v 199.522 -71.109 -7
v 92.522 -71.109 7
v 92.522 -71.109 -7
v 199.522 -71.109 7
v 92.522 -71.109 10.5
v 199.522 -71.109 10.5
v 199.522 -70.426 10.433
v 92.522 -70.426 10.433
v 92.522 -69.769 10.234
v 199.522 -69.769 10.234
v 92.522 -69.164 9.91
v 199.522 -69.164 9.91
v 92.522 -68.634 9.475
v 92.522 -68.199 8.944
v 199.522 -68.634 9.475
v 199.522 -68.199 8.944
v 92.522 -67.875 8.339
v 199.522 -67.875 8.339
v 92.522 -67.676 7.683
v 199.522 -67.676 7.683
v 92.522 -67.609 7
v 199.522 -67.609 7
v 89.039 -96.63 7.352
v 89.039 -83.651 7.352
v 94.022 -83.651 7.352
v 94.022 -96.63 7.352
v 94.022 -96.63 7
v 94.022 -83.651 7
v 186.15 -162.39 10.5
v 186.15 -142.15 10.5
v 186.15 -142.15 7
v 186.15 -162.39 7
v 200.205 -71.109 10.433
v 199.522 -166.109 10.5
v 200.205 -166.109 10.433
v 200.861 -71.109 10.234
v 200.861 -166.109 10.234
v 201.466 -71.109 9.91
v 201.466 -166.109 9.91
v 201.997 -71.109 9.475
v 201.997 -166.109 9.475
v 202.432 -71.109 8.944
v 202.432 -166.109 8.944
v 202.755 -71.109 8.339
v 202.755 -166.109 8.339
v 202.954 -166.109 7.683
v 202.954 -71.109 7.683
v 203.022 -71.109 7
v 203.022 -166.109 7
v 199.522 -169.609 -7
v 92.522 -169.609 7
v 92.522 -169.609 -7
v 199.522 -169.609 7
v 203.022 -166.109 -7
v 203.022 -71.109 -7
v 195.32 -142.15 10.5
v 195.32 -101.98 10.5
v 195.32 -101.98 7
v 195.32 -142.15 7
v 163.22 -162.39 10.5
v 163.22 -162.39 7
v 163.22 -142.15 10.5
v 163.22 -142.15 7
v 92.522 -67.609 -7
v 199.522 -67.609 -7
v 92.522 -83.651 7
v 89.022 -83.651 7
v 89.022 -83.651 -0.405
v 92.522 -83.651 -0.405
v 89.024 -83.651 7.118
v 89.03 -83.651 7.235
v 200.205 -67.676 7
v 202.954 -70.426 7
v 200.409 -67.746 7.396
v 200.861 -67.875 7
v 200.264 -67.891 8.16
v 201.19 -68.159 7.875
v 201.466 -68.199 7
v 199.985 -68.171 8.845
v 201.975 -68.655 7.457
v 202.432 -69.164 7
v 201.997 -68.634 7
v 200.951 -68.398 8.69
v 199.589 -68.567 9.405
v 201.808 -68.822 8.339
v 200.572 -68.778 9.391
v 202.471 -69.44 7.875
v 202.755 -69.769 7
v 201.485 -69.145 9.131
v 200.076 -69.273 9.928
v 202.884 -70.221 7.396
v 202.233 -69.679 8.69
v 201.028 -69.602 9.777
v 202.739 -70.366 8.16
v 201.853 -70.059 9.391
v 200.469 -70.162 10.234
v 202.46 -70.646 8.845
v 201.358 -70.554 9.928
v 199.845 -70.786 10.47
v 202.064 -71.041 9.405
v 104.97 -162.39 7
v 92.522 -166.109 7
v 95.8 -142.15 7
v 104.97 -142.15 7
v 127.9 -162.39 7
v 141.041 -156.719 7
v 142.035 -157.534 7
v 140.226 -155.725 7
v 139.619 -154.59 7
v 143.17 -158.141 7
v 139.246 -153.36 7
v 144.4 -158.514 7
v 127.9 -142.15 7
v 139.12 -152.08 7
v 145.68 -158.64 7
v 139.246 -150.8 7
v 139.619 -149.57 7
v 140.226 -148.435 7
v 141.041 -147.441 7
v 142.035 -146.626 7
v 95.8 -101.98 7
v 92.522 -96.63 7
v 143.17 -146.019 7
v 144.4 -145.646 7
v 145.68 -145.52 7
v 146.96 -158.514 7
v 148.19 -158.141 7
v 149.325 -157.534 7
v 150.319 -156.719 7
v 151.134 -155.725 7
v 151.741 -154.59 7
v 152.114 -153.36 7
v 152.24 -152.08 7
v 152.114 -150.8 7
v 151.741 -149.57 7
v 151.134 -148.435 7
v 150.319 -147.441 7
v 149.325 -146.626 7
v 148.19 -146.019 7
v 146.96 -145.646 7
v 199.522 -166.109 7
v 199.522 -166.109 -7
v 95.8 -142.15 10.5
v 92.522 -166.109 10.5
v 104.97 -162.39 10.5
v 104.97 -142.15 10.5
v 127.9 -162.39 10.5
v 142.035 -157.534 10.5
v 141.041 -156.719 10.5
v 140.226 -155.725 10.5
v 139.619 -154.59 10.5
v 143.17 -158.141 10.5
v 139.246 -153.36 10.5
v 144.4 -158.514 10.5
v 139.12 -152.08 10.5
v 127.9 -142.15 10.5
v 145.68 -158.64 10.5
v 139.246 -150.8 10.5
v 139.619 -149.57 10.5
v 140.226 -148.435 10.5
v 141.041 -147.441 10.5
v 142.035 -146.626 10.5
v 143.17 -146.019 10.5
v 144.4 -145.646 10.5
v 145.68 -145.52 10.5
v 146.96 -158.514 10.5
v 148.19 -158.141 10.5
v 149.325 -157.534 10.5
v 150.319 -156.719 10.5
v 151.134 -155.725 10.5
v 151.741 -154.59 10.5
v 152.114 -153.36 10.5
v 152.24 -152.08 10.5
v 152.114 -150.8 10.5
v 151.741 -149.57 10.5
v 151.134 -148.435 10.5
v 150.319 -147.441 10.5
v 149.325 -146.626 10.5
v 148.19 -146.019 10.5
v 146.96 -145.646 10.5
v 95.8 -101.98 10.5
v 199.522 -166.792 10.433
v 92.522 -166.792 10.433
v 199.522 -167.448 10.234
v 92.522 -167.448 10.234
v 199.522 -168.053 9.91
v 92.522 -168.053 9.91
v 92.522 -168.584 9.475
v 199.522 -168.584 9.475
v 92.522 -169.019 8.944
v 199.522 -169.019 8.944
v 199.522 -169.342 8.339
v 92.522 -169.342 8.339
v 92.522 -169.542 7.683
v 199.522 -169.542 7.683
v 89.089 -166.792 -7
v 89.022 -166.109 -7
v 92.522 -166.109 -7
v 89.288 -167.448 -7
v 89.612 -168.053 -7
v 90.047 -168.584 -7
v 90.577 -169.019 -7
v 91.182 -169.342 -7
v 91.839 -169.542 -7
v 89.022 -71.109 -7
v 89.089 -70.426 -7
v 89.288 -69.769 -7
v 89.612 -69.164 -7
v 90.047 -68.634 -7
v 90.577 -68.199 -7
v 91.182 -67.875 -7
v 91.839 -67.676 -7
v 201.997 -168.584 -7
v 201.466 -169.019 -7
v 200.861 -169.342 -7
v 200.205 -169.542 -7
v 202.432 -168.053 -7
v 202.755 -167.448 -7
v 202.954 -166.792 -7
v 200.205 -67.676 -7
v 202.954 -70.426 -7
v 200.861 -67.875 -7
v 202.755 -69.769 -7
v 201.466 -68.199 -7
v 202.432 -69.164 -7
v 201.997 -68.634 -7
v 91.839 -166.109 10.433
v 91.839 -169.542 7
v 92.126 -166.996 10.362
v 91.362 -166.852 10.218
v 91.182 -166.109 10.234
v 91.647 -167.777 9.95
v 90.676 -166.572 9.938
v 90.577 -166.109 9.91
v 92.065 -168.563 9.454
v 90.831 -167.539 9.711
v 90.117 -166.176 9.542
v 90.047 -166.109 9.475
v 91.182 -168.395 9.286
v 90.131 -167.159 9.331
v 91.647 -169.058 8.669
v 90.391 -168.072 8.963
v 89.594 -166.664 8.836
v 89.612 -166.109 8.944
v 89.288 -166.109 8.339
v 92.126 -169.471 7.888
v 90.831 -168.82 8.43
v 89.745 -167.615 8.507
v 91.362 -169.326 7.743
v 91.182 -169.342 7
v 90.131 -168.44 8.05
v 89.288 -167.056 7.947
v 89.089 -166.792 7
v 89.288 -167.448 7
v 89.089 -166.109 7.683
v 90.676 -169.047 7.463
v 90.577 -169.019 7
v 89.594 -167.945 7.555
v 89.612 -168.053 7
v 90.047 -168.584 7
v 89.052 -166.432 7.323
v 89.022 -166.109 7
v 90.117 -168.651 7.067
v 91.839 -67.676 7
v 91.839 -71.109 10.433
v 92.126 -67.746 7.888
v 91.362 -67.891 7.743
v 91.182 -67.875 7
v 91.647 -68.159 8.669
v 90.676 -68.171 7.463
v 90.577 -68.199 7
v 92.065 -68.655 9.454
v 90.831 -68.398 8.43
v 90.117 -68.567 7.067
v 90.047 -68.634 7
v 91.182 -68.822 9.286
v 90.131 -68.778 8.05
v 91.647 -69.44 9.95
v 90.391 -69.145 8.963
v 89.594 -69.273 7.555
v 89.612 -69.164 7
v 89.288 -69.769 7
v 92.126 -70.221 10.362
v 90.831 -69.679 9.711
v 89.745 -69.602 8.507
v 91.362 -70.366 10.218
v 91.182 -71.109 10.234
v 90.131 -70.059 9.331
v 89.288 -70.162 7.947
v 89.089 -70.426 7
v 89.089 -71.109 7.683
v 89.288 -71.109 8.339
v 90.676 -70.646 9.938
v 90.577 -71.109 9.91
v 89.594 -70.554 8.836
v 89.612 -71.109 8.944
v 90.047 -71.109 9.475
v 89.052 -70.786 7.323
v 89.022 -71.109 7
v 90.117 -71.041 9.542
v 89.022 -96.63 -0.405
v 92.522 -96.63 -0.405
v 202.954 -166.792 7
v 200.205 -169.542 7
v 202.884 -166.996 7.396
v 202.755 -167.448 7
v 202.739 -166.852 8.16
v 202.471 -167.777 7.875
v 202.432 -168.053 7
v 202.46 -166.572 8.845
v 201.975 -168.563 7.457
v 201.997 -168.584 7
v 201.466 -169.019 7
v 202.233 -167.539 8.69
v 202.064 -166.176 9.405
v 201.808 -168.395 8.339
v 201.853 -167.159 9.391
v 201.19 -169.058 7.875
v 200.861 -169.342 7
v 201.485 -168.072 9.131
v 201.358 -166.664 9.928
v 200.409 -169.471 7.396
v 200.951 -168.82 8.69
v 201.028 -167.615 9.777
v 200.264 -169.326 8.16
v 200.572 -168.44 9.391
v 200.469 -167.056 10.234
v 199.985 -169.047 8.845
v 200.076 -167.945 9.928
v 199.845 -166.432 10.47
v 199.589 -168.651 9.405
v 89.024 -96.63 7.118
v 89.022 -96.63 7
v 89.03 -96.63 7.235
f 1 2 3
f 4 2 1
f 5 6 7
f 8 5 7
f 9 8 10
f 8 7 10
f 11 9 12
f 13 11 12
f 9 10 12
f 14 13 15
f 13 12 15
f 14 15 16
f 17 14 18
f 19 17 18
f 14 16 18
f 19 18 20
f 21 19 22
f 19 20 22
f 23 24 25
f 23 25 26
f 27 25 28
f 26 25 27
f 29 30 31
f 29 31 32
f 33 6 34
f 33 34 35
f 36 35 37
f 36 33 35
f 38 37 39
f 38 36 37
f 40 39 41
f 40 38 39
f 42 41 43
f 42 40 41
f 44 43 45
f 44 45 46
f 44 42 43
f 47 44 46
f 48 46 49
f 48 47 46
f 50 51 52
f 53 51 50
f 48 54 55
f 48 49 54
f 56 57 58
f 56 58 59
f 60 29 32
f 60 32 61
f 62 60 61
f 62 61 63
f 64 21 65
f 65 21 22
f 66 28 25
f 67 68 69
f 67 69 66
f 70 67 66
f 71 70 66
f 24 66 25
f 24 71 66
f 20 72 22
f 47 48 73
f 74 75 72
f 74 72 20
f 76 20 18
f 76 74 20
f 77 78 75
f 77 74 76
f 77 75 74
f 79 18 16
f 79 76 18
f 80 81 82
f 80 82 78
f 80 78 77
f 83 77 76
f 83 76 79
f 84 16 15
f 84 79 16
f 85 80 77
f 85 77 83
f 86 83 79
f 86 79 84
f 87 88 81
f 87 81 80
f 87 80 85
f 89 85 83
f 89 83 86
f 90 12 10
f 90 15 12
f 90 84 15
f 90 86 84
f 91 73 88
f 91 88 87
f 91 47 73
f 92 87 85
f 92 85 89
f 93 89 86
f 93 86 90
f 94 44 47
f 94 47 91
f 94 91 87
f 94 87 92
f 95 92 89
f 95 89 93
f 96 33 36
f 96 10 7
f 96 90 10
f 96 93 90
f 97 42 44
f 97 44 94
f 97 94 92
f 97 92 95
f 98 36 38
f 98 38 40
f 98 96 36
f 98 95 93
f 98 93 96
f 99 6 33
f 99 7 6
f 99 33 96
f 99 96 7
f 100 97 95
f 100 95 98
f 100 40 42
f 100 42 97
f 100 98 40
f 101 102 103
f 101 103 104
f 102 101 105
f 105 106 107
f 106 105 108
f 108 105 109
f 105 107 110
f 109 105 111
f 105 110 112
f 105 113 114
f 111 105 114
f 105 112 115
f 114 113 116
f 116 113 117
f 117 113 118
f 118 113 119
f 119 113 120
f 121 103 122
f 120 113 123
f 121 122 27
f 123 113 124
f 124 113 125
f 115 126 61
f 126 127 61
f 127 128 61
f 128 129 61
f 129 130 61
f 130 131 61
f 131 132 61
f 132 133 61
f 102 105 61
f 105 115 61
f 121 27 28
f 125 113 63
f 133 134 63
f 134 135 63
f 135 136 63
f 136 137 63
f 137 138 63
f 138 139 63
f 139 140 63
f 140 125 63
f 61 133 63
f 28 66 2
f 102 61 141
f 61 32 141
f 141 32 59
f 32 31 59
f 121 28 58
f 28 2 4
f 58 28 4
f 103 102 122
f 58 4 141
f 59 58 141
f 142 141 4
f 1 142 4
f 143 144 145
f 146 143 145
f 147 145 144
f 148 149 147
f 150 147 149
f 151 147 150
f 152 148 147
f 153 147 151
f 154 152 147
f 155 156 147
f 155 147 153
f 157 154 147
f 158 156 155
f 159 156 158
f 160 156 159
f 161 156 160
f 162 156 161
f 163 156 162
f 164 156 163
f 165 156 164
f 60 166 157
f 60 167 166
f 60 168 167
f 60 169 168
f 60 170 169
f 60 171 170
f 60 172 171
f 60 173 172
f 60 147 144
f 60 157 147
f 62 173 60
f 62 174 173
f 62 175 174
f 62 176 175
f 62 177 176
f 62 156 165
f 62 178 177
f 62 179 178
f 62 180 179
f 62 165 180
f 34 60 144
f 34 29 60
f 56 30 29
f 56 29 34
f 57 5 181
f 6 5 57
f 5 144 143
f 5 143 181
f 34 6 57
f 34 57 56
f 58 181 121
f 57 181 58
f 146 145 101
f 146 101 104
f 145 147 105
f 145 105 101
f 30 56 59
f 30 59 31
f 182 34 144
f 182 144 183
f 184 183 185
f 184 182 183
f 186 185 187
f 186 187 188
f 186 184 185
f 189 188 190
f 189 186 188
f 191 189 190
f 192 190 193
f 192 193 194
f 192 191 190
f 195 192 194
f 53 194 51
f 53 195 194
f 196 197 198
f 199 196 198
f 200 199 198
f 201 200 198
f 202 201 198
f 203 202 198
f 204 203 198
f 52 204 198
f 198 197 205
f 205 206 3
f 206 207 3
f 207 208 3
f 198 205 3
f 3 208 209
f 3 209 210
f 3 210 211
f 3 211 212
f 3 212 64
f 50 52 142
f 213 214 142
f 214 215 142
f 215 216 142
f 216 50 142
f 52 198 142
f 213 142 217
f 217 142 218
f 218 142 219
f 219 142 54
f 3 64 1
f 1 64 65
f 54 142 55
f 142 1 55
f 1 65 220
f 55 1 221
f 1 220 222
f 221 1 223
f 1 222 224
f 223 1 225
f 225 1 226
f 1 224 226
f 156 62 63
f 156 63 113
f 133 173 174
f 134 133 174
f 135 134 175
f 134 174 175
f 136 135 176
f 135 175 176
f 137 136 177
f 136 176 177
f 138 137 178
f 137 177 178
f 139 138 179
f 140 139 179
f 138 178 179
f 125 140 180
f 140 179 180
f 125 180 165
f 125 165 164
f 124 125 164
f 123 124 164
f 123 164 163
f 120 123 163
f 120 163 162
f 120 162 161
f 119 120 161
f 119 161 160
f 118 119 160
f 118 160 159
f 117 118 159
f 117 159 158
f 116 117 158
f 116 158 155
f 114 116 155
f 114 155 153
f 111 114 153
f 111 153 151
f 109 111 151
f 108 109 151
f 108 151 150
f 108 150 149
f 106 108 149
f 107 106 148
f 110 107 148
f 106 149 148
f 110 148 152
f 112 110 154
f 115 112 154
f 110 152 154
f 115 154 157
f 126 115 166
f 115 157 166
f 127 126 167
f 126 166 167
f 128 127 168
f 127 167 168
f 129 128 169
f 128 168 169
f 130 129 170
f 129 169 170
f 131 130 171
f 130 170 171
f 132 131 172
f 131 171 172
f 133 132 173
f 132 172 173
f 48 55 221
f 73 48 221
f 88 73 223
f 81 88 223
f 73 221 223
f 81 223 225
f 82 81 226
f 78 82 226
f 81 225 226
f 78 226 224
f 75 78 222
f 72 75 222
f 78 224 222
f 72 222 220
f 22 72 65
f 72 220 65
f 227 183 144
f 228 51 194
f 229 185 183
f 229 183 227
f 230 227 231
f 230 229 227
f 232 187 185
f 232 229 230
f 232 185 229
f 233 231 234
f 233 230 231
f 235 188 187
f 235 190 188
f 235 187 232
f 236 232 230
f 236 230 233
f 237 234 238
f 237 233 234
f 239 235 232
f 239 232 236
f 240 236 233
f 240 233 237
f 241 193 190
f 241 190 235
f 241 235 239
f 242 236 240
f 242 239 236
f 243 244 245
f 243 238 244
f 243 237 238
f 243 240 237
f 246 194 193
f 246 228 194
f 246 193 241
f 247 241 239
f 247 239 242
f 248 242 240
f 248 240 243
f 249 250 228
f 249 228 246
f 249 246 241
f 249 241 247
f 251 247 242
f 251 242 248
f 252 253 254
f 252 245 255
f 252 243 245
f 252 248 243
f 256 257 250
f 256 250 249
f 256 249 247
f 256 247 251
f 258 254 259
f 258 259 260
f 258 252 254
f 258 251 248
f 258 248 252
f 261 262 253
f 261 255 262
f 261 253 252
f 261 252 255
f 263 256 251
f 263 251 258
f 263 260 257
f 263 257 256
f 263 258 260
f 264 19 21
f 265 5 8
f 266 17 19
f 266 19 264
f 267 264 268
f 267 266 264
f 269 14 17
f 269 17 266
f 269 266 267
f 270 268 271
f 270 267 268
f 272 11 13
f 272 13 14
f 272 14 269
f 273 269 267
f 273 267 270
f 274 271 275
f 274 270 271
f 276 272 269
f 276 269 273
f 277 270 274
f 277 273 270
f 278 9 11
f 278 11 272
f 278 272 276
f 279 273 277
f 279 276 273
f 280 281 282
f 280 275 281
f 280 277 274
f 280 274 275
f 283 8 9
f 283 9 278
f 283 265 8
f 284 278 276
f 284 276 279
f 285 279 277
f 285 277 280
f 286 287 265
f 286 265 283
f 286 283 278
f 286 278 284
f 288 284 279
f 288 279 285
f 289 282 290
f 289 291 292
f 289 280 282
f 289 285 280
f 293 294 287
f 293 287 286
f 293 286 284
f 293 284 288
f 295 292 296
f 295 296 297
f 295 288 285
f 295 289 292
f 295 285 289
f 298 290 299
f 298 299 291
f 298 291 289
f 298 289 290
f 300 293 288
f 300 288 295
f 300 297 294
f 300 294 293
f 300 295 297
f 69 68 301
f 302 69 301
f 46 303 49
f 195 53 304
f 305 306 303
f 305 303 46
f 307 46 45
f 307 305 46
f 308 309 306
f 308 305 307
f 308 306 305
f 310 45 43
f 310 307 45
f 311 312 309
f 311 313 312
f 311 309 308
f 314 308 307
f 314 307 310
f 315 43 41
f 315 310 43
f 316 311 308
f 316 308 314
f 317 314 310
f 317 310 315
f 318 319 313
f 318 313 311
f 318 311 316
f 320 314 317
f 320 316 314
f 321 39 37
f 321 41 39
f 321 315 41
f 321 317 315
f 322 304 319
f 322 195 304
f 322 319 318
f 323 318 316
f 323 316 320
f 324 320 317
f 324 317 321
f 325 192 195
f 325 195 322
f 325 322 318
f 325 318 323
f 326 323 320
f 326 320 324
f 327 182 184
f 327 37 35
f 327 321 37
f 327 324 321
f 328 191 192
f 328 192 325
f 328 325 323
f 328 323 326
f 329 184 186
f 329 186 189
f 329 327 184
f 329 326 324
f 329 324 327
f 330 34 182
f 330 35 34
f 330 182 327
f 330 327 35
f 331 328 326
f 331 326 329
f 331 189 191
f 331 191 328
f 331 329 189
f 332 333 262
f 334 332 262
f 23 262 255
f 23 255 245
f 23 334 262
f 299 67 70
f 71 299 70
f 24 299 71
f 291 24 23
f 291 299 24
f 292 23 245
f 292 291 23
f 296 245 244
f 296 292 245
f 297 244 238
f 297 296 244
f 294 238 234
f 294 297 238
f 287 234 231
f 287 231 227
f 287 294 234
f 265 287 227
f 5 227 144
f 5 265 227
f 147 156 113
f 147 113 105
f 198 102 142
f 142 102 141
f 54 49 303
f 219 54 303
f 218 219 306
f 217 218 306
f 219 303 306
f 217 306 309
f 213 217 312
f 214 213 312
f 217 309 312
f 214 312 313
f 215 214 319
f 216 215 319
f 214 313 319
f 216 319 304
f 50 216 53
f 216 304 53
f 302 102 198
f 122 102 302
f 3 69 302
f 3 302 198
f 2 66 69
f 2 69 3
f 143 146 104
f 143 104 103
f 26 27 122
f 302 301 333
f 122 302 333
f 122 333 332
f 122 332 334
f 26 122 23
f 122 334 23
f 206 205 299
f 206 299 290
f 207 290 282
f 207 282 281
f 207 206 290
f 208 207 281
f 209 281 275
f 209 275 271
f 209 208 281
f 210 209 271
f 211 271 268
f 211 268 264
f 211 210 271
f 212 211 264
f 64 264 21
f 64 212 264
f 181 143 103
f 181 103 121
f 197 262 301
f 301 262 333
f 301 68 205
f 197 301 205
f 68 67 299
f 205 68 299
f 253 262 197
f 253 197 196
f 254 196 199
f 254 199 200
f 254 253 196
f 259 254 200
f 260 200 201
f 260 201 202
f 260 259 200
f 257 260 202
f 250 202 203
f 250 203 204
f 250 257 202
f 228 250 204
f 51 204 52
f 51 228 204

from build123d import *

# Parameters (mm, degrees)
SKETCH_W        = 107
SKETCH_H        = 95
PAD_DEPTH       = 7
THICKNESS_T     = 3.5
SKETCH001_R     = 6.56
POCKET_DEPTH    = 5
SKETCH002_W     = 12.979027
SKETCH002_H     = 7.757147
POCKET001_DEPTH = 5


with BuildPart() as part:
    # Sketch → Pad (new body, symmetric)
    with BuildSketch(Plane.XY):
        with Locations((146.021704, -118.608821)):
            Rectangle(SKETCH_W, SKETCH_H)
    extrude(amount=PAD_DEPTH, both=True)

    # Thickness
    thickness_openings = [part.faces().sort_by_distance(p)[0] for p in [
        (146.021704, -118.608821, -7),
    ]]
    offset(amount=THICKNESS_T, openings=thickness_openings)

    # Sketch001 (on Face18 of Thickness) → Pocket (cut)
    with BuildSketch(Plane.XY.offset(10.5)):
        with Locations((145.68, -152.08)):
            Circle(SKETCH001_R)
        Polygon((95.8, -101.98), (195.32, -101.98), (195.32, -142.15), (186.15, -142.15), (186.15, -162.39), (163.22, -162.39), (163.22, -142.15), (127.9, -142.15), (127.9, -162.39), (104.97, -162.39), (104.97, -142.15), (95.8, -142.15), align=None)
    extrude(amount=-POCKET_DEPTH, mode=Mode.SUBTRACT)

    # Sketch002 (on Face11 of Pocket) → Pocket001 (cut)
    with BuildSketch(Plane(origin=(89.021704, 0, 0), x_dir=(0, -1, 0), z_dir=(-1, 0, 0))):
        with Locations((90.140796, 3.473584)):
            Rectangle(SKETCH002_W, SKETCH002_H)
    extrude(amount=-POCKET001_DEPTH, mode=Mode.SUBTRACT)


solid = part.part
